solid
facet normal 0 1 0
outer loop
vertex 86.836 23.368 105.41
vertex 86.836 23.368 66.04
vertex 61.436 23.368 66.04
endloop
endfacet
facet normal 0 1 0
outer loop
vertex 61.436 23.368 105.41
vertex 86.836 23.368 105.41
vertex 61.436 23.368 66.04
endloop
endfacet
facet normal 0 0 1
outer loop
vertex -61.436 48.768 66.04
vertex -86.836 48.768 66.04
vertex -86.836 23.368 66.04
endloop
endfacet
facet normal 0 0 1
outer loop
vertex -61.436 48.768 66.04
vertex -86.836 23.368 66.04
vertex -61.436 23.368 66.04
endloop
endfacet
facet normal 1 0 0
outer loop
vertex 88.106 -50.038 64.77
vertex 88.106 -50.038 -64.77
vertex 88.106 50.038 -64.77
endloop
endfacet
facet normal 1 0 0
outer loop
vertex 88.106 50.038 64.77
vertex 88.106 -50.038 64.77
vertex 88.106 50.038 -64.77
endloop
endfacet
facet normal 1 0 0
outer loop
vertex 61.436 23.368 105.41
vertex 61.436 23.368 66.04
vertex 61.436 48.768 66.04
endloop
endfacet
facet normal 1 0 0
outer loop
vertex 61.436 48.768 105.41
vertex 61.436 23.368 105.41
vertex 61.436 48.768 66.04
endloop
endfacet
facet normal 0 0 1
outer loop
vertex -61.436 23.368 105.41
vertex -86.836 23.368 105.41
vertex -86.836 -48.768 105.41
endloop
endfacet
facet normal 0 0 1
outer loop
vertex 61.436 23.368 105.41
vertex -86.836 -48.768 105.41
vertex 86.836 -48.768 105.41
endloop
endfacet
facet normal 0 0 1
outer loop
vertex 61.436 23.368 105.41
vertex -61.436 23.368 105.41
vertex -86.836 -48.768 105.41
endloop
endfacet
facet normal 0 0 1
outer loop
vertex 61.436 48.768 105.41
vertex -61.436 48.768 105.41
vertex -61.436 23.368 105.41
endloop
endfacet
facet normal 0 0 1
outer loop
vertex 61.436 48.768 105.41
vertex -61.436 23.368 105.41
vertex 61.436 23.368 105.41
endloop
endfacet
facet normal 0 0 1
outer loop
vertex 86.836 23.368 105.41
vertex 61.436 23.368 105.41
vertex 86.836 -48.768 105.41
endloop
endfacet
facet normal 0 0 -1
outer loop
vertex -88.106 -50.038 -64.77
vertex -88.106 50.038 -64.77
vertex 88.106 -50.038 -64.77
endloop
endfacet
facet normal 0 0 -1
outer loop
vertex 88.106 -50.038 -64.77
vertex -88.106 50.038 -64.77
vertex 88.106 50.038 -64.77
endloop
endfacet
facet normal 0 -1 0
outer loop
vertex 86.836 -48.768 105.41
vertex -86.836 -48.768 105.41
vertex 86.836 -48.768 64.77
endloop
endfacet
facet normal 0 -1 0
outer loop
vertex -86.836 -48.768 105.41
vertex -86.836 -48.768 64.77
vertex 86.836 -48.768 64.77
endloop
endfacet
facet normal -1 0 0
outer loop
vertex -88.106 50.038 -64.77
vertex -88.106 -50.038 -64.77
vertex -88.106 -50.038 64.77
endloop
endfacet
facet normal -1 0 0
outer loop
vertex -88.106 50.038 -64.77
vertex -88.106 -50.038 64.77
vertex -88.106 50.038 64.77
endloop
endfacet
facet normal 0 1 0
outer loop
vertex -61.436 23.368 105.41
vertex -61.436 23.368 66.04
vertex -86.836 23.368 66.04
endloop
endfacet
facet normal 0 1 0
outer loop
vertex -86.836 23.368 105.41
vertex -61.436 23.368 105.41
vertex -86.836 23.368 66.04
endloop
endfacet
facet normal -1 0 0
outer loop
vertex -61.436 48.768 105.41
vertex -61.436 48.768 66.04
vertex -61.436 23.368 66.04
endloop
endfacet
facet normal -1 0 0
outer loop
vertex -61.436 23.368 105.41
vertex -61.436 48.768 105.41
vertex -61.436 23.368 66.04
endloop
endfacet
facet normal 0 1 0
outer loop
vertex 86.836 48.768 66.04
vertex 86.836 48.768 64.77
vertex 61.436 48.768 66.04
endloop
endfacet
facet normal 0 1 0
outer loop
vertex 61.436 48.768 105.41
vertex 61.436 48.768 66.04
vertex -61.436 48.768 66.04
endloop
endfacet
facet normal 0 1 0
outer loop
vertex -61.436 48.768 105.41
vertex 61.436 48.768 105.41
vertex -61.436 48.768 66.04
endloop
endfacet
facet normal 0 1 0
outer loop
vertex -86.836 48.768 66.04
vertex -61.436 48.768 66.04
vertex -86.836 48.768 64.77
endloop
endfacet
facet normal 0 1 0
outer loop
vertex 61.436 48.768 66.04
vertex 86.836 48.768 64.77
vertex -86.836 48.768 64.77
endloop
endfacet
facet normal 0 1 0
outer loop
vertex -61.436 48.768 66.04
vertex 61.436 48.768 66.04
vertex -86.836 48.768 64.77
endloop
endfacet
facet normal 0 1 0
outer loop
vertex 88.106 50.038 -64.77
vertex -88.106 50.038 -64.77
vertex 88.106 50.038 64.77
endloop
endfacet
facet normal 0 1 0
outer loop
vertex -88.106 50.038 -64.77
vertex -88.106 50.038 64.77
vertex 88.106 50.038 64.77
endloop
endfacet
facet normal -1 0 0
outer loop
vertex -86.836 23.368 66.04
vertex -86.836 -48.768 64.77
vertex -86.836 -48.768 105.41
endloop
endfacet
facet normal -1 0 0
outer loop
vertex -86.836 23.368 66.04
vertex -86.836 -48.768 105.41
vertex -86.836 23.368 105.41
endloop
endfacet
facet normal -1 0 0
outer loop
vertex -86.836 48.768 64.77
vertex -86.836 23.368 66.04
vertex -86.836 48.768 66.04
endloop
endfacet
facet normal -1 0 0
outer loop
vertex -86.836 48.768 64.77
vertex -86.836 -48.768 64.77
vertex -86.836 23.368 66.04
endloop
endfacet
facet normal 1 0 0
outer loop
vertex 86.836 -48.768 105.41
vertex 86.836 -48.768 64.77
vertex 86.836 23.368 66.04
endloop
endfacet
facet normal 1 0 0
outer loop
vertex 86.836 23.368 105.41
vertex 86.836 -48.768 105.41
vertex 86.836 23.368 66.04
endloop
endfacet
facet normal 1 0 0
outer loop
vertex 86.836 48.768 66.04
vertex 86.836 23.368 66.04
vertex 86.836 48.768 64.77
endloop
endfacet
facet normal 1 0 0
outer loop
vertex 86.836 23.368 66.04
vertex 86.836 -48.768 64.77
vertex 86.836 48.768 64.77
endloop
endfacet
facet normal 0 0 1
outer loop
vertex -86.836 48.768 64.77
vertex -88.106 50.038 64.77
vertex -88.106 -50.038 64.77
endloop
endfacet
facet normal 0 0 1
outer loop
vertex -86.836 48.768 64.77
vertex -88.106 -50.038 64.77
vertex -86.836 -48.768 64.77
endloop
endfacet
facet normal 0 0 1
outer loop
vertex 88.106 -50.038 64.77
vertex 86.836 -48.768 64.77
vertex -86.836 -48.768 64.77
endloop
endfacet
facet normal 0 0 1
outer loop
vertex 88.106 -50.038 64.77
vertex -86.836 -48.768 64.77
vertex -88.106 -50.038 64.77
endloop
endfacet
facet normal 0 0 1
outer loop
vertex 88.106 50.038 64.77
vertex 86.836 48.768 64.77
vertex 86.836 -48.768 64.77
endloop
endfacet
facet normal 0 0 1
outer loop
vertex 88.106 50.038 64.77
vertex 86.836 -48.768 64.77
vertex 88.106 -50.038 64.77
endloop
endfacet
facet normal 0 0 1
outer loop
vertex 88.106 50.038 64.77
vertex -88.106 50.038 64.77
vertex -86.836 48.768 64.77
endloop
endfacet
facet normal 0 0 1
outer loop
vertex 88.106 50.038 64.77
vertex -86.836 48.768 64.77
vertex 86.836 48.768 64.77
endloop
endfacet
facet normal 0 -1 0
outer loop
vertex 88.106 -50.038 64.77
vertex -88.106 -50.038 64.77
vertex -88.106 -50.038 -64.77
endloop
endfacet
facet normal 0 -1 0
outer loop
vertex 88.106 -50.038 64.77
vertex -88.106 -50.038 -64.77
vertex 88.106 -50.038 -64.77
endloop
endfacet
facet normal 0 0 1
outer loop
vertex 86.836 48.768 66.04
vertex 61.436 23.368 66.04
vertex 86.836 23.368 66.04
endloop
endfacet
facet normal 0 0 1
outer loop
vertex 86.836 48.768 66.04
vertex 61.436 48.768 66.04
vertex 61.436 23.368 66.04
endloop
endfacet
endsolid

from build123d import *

# Parameters (mm, degrees)
F0_W     = 176.2125
F0_H     = 100.076
F1_DEPTH = 64.77
F2_W     = 173.6725
F2_H     = 97.536
F3_DEPTH = 1.27
F5_DEPTH = 39.37


with BuildPart() as f1:
    # F0 (on Top) → F1 (new body, symmetric)
    with BuildSketch(Plane.XY):
        Rectangle(F0_W, F0_H)
    extrude(amount=F1_DEPTH, both=True)

    # F2 (on face) → F3 (join)
    with BuildSketch(Plane.XY.offset(64.77)):
        Rectangle(F2_W, F2_H)
    extrude(amount=F3_DEPTH)

    # F4 (on face) → F5 (join)
    with BuildSketch(Plane.XY.offset(66.04)):
        Polygon((61.43625, 48.768), (-61.43625, 48.768), (-61.43625, 23.368), (-86.83625, 23.368), (-86.83625, -48.768), (86.83625, -48.768), (86.83625, 23.368), (61.43625, 23.368), align=None)
    extrude(amount=F5_DEPTH)


solid = f1.part
